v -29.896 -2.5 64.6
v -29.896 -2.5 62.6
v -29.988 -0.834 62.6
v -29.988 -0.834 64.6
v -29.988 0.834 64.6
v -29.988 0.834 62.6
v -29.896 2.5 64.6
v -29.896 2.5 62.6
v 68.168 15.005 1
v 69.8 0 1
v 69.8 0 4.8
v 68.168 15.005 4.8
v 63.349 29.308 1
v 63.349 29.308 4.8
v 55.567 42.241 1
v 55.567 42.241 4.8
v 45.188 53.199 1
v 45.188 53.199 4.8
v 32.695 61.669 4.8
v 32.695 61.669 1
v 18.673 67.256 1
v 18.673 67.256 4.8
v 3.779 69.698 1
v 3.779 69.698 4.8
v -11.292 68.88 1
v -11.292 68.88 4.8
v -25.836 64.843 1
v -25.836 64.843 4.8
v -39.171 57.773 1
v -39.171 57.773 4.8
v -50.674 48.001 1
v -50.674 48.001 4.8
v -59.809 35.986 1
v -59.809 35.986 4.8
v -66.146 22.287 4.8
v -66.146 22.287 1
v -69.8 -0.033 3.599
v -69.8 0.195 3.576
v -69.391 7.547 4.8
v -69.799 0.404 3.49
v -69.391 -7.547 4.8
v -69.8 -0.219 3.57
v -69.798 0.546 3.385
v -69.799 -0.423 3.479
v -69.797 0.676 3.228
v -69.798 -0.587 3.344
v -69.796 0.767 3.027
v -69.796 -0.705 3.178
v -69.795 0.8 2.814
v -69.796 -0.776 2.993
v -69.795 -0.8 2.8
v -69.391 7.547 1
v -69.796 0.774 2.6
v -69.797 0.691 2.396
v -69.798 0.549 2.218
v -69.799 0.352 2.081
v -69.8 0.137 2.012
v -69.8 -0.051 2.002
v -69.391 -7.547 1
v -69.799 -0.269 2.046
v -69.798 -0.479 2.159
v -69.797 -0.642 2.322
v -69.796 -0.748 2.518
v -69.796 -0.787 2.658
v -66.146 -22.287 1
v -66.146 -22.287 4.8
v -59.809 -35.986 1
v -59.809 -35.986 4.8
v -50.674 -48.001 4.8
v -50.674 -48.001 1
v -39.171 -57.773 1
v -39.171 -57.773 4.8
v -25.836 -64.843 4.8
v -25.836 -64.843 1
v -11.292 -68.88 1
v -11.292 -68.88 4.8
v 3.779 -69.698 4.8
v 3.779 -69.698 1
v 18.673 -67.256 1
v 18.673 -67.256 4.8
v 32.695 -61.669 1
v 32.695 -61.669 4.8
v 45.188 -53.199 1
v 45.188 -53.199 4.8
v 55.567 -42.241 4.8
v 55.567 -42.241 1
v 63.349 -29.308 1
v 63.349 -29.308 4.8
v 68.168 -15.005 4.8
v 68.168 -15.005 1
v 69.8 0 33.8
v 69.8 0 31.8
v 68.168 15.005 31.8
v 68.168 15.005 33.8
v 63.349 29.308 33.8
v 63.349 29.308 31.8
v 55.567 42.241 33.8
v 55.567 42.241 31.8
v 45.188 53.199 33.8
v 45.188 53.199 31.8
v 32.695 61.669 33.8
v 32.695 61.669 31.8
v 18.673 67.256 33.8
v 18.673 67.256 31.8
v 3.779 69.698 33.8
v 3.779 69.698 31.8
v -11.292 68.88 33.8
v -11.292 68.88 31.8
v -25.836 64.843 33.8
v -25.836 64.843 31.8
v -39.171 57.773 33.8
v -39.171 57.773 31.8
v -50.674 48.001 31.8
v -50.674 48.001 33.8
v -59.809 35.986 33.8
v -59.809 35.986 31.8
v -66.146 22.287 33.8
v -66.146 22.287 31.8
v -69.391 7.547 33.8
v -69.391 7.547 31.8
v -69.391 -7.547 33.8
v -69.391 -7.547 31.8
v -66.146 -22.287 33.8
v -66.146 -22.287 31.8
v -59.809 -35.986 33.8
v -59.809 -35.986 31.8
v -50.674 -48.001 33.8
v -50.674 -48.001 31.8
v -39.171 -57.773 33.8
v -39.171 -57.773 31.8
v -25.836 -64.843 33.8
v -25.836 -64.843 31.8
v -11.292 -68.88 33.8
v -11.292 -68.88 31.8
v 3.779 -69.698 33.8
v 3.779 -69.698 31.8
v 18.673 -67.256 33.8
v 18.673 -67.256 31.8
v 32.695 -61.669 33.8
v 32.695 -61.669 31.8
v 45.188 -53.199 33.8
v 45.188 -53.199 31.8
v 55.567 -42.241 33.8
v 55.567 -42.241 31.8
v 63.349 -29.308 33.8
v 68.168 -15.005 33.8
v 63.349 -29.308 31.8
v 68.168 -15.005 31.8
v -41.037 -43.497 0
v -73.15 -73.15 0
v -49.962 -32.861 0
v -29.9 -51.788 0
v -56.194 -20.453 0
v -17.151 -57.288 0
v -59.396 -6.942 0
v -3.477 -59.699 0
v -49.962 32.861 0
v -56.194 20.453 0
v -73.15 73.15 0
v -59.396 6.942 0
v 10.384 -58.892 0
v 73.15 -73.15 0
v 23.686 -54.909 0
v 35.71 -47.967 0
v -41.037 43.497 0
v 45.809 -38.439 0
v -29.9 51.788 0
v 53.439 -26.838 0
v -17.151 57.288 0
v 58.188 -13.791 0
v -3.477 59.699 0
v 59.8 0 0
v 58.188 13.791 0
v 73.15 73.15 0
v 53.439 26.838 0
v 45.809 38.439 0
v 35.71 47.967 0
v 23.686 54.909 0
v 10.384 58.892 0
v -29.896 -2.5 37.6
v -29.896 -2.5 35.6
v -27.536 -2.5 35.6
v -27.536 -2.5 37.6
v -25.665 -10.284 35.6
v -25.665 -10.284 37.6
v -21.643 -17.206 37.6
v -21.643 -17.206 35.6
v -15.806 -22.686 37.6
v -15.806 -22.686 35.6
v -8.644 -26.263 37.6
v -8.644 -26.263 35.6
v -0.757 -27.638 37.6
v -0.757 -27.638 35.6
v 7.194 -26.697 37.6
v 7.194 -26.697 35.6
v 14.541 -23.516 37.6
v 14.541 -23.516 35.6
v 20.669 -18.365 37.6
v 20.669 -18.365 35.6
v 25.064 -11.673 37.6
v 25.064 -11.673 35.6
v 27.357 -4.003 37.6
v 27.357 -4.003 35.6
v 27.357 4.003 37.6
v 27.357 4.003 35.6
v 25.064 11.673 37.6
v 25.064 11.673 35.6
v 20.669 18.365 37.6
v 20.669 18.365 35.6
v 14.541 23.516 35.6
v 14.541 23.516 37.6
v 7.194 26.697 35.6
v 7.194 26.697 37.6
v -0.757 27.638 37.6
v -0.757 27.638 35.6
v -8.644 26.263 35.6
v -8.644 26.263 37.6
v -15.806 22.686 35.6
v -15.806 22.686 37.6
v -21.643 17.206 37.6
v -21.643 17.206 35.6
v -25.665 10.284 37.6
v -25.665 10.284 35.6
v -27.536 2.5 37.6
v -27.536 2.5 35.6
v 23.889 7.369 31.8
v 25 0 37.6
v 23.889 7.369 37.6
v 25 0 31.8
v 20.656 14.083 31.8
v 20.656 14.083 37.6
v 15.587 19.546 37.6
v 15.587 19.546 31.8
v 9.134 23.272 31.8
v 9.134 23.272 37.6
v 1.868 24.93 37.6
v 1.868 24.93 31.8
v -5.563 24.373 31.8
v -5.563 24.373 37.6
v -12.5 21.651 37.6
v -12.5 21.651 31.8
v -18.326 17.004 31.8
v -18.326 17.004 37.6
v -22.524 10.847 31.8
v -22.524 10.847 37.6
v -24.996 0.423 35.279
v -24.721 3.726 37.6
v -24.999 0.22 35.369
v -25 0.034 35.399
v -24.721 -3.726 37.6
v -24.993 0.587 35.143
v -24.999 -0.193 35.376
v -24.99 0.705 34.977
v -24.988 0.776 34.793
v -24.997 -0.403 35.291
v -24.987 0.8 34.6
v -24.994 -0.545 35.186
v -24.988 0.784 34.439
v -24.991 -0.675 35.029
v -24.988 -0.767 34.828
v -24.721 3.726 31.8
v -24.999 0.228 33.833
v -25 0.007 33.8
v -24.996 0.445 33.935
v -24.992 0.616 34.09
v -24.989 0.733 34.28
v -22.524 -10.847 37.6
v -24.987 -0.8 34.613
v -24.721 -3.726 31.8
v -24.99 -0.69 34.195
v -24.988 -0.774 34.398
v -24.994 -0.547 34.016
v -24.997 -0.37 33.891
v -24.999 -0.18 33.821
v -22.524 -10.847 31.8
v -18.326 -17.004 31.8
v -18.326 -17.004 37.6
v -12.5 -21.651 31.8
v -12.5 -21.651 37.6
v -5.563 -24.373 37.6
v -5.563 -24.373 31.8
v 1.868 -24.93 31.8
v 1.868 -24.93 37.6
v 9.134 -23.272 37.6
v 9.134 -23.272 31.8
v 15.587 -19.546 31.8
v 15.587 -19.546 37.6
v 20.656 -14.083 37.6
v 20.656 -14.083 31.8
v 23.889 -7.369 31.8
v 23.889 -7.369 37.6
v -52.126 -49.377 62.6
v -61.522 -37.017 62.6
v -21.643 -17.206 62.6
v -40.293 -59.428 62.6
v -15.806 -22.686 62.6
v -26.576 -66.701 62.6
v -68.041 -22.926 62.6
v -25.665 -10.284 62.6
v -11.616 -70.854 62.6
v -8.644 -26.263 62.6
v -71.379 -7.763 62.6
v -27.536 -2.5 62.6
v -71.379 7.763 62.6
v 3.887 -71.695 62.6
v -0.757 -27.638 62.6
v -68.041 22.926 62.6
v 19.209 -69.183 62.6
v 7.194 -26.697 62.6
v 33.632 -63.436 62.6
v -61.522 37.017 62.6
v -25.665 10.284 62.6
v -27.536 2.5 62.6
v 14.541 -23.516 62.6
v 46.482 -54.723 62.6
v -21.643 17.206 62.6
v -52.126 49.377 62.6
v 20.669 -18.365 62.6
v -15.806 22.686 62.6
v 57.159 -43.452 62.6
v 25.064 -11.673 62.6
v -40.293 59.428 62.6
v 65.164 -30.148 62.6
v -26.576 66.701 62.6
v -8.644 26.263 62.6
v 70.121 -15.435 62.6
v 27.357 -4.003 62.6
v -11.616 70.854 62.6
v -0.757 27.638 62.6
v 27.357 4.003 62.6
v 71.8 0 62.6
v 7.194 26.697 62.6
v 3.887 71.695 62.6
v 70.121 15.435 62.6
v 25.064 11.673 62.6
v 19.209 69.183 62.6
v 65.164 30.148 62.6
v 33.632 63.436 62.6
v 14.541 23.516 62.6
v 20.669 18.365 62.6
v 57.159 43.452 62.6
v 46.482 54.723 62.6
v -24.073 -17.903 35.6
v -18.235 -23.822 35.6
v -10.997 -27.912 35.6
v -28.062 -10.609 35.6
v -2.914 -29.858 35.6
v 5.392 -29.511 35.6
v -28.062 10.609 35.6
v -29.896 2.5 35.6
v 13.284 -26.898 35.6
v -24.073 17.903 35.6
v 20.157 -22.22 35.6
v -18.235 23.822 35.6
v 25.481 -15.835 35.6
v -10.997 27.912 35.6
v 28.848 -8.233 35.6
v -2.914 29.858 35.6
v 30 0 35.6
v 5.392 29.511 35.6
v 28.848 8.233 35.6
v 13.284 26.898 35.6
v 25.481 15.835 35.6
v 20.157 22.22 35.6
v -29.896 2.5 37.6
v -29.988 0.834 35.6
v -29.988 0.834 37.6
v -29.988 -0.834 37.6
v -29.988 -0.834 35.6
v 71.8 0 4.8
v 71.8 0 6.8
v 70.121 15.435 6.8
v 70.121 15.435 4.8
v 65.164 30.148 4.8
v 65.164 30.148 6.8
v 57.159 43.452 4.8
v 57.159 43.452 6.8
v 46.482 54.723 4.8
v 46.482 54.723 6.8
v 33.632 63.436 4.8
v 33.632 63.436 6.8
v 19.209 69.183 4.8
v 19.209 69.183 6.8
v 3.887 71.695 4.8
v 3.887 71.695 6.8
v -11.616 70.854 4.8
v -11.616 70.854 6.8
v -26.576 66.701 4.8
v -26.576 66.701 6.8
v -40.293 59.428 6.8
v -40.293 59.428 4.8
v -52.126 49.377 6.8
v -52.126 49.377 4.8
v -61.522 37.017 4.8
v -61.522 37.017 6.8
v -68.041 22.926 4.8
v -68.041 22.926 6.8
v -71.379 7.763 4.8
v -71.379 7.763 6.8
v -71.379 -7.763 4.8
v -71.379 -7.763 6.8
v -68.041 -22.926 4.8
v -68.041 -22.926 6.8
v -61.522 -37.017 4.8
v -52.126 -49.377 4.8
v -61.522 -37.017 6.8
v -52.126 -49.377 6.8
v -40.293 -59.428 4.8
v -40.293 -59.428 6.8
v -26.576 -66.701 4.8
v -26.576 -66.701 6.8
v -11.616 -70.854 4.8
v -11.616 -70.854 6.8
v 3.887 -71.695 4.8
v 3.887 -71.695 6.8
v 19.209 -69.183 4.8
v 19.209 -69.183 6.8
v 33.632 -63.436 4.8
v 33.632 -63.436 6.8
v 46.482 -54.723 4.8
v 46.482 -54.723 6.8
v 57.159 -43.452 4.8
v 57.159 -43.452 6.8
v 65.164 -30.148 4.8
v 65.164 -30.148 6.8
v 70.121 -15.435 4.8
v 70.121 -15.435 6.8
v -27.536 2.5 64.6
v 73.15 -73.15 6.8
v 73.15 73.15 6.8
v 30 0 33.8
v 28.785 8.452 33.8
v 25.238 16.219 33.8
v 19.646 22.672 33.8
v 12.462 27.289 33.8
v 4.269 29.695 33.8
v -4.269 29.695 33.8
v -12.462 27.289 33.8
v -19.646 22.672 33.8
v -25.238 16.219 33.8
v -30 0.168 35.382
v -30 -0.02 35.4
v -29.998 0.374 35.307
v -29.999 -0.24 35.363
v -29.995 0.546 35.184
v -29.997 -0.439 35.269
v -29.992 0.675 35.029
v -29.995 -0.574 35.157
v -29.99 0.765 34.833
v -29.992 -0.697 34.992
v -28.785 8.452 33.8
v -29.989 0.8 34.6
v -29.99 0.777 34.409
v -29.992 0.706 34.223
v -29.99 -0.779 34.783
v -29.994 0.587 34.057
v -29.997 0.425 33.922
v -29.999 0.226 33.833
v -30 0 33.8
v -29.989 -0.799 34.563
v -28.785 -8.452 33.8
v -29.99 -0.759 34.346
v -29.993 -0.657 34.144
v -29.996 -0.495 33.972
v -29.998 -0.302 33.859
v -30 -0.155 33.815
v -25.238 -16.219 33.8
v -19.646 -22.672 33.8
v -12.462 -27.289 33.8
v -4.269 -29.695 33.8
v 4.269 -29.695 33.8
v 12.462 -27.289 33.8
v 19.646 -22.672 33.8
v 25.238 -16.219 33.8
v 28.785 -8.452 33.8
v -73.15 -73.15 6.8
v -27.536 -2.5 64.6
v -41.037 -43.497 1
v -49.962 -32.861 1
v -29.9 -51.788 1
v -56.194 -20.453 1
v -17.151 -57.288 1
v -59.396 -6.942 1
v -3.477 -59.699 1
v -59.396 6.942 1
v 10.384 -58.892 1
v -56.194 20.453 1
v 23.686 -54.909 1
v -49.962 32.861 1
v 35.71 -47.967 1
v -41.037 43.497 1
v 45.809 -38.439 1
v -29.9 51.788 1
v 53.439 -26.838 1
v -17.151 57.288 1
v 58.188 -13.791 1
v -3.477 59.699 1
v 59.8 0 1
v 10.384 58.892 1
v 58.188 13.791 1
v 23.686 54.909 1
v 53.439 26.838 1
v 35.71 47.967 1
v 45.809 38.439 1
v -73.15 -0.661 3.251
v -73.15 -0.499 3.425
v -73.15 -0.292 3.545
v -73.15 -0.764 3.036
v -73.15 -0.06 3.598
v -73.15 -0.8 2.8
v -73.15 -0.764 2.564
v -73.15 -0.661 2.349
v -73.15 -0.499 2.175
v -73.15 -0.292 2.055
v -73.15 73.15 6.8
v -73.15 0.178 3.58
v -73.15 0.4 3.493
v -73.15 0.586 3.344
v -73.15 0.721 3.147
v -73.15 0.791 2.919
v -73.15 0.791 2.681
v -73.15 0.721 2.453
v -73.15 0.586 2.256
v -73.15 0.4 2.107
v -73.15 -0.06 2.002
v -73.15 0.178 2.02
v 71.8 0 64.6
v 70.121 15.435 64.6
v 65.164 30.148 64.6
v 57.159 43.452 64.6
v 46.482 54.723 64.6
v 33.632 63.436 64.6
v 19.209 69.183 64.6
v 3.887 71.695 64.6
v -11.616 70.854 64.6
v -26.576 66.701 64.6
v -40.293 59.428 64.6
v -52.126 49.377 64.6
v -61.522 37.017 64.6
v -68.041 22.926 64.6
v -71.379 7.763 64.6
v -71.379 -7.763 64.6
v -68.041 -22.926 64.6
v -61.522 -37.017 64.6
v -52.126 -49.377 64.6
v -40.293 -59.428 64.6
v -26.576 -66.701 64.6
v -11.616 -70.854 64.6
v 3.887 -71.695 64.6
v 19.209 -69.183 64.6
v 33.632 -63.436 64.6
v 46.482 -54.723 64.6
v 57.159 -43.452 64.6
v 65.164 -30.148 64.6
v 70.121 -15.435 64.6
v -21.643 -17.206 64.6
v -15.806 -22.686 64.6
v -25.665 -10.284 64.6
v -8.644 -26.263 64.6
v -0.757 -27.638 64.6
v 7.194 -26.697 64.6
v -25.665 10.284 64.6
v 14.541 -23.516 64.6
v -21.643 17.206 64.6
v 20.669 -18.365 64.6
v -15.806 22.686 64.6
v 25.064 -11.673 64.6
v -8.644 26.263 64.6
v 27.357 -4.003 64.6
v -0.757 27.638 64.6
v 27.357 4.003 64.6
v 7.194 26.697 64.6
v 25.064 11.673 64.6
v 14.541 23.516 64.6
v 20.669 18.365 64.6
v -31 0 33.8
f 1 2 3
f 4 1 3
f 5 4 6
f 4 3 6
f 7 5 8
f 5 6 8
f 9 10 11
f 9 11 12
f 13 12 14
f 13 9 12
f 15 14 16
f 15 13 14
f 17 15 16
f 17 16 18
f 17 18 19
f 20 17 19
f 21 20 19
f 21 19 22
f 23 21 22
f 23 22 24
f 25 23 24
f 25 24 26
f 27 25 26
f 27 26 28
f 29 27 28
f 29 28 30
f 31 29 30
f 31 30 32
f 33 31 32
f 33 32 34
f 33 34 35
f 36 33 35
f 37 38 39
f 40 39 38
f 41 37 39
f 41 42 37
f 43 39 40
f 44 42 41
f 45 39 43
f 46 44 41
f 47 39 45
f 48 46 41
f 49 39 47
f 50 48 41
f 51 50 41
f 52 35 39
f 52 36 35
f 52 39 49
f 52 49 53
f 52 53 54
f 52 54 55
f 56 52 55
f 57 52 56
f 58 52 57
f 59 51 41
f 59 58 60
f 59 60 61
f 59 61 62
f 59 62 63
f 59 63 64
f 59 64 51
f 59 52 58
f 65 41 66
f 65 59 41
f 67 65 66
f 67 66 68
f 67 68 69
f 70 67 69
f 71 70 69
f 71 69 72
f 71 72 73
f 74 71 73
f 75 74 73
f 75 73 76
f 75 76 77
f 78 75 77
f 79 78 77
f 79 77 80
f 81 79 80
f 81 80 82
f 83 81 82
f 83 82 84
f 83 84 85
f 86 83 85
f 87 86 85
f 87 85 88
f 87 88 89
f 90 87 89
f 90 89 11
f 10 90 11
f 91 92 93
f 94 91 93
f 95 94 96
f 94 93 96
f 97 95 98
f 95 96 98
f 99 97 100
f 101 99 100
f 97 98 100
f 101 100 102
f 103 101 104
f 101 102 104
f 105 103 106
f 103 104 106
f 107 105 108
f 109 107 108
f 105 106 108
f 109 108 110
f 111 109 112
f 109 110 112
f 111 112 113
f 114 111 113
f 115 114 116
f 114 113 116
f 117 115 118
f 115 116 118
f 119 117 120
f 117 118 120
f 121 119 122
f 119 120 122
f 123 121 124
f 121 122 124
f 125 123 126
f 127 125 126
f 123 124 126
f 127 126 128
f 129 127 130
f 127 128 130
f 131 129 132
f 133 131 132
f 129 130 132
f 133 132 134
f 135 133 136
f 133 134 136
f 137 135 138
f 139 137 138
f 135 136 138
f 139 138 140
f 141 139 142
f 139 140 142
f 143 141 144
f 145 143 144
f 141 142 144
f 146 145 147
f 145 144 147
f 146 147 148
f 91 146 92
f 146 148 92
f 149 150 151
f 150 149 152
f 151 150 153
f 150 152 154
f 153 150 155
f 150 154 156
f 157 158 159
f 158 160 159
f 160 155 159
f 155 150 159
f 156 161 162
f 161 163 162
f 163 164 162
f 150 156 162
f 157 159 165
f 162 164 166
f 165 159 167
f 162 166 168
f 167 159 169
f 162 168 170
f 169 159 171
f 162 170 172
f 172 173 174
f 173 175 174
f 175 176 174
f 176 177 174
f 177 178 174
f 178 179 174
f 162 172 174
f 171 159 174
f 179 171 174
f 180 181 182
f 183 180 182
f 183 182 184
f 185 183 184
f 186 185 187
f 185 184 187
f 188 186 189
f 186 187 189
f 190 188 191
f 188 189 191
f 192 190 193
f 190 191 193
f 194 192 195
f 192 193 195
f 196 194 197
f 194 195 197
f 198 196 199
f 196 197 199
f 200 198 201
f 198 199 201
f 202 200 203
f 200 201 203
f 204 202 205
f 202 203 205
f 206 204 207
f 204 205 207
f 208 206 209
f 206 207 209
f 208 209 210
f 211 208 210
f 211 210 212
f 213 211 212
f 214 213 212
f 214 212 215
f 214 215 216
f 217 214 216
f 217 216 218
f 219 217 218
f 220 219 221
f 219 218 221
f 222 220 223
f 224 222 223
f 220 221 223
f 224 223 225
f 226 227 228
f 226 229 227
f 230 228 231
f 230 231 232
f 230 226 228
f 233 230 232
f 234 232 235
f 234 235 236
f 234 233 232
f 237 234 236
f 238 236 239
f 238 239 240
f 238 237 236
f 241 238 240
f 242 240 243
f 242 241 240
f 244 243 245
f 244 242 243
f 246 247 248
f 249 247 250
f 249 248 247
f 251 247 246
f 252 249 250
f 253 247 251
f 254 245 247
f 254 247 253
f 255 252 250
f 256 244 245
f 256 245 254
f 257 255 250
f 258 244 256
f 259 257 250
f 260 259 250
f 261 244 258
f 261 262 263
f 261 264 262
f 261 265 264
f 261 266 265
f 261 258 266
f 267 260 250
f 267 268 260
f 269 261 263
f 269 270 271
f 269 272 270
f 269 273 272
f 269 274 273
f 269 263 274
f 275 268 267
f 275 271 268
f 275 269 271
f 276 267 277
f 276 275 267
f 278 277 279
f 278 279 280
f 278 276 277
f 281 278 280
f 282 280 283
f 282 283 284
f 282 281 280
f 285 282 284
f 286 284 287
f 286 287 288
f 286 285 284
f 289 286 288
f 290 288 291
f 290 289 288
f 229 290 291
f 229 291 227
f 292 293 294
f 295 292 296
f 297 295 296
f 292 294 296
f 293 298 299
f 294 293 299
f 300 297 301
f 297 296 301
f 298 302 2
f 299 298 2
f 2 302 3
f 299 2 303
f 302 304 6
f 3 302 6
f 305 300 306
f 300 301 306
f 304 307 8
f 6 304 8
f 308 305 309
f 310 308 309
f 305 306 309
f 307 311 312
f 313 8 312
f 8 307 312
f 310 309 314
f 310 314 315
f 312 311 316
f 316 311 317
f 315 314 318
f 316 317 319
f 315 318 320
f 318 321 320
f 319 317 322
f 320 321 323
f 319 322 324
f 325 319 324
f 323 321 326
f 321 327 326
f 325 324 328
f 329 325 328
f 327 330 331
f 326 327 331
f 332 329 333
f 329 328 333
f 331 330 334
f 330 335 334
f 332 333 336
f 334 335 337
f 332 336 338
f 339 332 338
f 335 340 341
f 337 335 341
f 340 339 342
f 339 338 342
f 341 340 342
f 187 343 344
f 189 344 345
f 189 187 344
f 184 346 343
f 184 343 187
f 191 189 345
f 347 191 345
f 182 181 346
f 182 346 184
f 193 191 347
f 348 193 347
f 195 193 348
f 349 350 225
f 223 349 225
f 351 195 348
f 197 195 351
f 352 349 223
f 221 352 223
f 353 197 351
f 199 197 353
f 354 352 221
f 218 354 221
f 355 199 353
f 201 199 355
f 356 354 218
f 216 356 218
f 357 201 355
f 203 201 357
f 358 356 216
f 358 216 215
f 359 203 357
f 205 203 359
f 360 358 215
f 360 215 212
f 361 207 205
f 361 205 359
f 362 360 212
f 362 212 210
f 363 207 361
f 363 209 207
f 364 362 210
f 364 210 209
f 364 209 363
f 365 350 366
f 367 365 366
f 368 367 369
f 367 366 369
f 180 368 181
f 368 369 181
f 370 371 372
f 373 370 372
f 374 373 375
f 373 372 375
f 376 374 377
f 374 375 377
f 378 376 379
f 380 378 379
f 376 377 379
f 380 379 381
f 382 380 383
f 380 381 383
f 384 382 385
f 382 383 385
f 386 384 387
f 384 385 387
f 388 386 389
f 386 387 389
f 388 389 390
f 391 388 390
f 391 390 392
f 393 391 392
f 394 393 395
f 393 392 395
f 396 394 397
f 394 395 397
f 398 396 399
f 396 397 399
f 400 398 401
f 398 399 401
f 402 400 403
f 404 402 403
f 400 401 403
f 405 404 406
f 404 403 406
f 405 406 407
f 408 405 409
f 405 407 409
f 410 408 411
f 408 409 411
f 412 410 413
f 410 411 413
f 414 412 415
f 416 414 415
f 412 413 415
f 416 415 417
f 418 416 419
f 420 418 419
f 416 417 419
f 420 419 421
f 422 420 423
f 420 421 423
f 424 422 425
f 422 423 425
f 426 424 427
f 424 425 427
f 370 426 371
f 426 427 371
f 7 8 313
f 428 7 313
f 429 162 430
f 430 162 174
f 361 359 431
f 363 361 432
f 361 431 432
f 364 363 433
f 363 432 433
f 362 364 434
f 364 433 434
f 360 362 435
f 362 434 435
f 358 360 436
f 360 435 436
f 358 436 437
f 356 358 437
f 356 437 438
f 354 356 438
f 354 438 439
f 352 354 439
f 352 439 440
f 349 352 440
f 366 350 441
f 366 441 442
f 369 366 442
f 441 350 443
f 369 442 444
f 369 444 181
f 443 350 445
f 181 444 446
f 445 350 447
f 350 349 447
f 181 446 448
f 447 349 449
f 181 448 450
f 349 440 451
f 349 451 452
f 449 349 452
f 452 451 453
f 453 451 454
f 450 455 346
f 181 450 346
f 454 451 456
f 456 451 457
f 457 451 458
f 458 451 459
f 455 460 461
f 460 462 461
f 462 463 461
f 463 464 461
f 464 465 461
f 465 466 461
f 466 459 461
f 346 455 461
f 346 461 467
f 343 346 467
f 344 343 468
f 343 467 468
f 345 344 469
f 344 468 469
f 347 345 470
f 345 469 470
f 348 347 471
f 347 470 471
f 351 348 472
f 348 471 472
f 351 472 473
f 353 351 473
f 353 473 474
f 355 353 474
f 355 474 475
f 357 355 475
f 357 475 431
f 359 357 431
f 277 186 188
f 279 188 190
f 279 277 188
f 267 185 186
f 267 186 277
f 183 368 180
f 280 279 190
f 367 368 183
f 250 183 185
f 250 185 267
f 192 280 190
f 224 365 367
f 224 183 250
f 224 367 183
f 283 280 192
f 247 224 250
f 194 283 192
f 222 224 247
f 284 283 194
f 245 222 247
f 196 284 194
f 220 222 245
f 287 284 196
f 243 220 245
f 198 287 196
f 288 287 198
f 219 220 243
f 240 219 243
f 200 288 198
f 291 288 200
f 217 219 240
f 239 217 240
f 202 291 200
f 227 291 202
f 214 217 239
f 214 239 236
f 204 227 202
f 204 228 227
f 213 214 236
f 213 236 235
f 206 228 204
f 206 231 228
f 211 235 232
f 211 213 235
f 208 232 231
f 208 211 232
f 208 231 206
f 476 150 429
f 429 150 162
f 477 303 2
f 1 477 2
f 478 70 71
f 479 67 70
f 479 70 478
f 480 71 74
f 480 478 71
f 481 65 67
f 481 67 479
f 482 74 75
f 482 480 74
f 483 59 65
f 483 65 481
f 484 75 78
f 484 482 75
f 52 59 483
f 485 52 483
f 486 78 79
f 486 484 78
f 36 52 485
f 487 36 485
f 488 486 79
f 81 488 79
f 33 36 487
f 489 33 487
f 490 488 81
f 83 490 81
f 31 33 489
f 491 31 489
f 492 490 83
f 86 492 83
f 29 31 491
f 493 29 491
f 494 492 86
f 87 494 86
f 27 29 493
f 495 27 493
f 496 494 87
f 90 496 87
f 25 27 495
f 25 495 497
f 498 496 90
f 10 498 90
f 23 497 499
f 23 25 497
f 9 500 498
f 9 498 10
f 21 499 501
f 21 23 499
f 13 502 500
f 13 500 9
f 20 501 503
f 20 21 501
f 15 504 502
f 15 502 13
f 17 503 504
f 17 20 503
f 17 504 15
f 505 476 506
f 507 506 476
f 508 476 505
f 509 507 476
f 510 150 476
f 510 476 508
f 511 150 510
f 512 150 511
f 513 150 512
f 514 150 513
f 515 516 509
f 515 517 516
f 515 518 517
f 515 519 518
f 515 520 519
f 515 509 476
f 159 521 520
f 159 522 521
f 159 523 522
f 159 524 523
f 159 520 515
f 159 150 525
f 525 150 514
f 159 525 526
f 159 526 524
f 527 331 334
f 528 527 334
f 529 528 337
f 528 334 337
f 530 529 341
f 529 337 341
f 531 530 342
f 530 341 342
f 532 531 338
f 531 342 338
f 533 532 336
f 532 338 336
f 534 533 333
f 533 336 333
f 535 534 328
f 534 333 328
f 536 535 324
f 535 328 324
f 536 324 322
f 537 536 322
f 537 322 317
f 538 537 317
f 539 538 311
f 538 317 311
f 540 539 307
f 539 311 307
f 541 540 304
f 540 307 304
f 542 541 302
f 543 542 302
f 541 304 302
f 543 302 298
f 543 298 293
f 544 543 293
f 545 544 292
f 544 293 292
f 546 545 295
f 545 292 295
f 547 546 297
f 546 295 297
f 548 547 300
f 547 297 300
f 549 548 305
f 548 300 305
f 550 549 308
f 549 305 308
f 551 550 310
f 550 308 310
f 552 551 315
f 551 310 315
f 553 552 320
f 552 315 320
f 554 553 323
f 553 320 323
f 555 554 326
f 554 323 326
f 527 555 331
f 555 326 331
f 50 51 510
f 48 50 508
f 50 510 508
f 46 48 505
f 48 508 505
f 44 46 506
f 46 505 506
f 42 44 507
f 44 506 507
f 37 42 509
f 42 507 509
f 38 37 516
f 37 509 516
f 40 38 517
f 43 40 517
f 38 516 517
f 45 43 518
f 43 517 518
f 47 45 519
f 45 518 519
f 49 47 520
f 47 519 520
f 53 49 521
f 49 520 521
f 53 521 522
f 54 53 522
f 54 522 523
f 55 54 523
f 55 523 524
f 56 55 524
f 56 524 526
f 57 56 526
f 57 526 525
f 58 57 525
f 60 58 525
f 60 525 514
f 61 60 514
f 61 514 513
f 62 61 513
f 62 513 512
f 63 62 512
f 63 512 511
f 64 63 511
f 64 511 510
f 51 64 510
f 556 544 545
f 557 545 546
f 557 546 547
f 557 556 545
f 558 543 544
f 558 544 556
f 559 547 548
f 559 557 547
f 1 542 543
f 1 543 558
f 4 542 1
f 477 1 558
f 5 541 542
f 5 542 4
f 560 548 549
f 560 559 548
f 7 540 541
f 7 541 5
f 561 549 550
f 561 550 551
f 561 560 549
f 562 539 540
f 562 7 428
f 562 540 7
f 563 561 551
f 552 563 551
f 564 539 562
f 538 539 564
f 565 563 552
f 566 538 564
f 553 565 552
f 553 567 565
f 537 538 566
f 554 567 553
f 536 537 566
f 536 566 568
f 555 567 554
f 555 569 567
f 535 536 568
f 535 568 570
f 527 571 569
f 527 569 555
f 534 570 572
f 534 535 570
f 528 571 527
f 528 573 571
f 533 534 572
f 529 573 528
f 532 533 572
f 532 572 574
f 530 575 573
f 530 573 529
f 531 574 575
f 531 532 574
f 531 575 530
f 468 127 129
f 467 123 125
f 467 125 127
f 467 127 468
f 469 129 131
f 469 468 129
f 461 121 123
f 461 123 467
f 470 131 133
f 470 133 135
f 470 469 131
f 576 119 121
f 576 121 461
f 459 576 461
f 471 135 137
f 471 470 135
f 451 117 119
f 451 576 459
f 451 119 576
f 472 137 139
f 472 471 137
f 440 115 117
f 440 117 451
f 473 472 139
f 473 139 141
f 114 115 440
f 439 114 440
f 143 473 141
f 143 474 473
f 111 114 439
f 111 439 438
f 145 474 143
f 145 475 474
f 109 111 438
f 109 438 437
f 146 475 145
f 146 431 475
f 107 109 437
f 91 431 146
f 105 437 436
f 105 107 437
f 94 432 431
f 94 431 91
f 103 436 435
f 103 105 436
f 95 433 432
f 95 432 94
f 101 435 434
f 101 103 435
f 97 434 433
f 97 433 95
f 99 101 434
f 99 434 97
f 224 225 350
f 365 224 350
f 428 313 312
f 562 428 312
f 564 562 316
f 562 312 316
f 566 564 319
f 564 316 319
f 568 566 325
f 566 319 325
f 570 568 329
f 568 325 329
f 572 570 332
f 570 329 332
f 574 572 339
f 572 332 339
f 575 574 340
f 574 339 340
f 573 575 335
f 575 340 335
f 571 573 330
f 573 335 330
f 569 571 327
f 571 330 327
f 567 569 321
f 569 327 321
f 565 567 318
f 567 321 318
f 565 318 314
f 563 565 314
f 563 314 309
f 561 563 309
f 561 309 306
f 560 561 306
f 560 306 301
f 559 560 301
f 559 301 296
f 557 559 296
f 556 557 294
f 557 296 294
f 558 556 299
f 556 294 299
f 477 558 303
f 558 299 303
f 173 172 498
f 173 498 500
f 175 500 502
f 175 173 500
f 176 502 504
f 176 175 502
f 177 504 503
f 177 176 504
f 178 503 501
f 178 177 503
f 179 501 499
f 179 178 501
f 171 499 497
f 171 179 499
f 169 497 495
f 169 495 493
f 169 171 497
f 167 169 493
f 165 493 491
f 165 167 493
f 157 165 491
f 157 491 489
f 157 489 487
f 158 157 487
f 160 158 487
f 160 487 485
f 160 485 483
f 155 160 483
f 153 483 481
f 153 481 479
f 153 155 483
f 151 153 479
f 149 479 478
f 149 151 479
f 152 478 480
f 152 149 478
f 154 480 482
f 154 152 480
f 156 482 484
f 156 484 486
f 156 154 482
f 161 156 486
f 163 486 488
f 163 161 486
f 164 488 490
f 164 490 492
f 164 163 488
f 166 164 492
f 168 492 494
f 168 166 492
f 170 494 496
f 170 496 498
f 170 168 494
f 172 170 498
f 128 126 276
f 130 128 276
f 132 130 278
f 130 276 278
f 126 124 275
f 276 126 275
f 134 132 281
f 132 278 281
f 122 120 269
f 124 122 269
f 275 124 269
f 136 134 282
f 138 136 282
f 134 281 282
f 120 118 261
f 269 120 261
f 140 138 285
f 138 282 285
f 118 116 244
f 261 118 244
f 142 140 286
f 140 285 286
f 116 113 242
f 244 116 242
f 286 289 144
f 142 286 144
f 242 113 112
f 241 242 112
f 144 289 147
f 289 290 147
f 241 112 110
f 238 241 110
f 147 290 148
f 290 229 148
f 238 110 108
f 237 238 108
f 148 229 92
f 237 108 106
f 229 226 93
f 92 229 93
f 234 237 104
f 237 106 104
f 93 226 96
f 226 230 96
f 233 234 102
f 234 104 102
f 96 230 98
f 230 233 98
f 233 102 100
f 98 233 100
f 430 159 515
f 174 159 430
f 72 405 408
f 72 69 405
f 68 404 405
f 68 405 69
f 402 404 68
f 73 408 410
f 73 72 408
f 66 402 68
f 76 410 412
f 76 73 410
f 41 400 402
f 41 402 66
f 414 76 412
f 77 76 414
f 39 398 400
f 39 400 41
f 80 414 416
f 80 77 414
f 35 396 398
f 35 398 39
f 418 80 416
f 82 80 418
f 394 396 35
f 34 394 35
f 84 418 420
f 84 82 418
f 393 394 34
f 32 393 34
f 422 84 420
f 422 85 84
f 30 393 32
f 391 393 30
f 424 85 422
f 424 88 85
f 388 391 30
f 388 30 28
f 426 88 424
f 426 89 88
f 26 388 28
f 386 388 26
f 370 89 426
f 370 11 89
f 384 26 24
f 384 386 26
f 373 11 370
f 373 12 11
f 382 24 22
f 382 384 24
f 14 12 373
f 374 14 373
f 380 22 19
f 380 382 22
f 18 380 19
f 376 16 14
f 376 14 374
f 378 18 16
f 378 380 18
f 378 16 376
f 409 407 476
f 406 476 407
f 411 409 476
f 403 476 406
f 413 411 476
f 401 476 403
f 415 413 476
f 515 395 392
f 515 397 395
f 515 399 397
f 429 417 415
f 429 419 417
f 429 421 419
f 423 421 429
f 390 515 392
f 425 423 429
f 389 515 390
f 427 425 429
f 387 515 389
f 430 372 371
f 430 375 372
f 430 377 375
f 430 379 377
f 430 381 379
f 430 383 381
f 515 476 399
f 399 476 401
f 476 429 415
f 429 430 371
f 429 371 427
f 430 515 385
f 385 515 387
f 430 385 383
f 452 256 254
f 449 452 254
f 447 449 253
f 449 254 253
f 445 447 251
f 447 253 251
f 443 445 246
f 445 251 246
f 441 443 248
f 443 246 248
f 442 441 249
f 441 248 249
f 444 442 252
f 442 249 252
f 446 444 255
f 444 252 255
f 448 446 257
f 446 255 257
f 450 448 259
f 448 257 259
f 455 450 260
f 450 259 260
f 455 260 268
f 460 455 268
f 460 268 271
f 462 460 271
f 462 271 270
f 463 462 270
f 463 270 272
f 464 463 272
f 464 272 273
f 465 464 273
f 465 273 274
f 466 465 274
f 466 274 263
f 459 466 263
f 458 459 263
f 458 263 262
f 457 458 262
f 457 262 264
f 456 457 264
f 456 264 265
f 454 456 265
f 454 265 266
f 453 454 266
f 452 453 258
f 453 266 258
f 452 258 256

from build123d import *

# Parameters (mm, degrees)
F0_W      = 146.3
F0_H      = 146.3
F0_R      = 69.8
F1_DEPTH  = 6.8
F0_R_2    = 59.8
F2_DEPTH  = 1
F4_R      = 69.8
F4_R_2    = 30
F5_DEPTH  = 2
F4_R_3    = 25
F6_DEPTH  = 3.8
F7_R      = 25
F8_DEPTH  = 2
F9_R      = 0.8
F10_DEPTH = 31.0000001
F12_R     = 71.8
F13_DEPTH = 2
F14_R     = 0.8
F15_DEPTH = 3.3555847778
F16_R     = 71.8
F16_R_2   = 69.8
F17_DEPTH = 2
F18_DEPTH = 2


with BuildPart() as f1:
    # F0 (on Top) → F1 (new body)
    with BuildSketch(Plane.XY):
        Rectangle(F0_W, F0_H)
        Circle(F0_R, mode=Mode.SUBTRACT)
    extrude(amount=F1_DEPTH)

    # F0 (on Top) → F2 (join)
    with BuildSketch(Plane.XY):
        Circle(F0_R)
        Circle(F0_R_2, mode=Mode.SUBTRACT)
    extrude(amount=F2_DEPTH)

    # F14 (on face) → F15 (cut, through all)
    with BuildSketch(Plane(origin=(-73.15, 0, 0), x_dir=(0, -1, 0), z_dir=(-1, 0, 0))):
        with Locations((0, 2.8)):
            Circle(F14_R)
    extrude(amount=-F15_DEPTH, mode=Mode.SUBTRACT)

    # F16 (on face) → F17 (cut)
    with BuildSketch(Plane.XY.offset(6.8)):
        Circle(F16_R)
        Circle(F16_R_2, mode=Mode.SUBTRACT)
    extrude(amount=-F17_DEPTH, mode=Mode.SUBTRACT)


with BuildPart() as f5:
    # F4 (on offset) → F5 (new body)
    with BuildSketch(Plane.XY.offset(31.8)):
        Circle(F4_R)
        Circle(F4_R_2, mode=Mode.SUBTRACT)
    extrude(amount=F5_DEPTH)

    # F4 (on offset) → F6 (join)
    with BuildSketch(Plane.XY.offset(31.8)):
        Circle(F4_R_2)
        Circle(F4_R_3, mode=Mode.SUBTRACT)
    extrude(amount=F6_DEPTH)

    # F7 (on face) → F8 (join)
    with BuildSketch(Plane.XY.offset(35.6)):
        with BuildLine():
            ThreePointArc((-27.5355140939, -2.5), (1.2512820546, -27.6204422418), (27.6487709747, 0))
            ThreePointArc((27.6487709747, 0), (1.2512820546, 27.6204422418), (-27.5355140939, 2.5))
            ThreePointArc((-27.5355140939, 2.5), (-27.6487709747, 0), (-27.5355140939, -2.5))
        make_face()
        Circle(F7_R, mode=Mode.SUBTRACT)
        with BuildLine():
            ThreePointArc((-27.5355140939, -2.5), (-27.6487709747, 0), (-27.5355140939, 2.5))
            Line((-27.5355140939, 2.5), (-29.8956518578, 2.5))
            ThreePointArc((-29.8956518578, 2.5), (-30, 0), (-29.8956518578, -2.5))
            Line((-29.8956518578, -2.5), (-27.5355140939, -2.5))
        make_face()
    extrude(amount=F8_DEPTH)

    # F9 (on Right) → F10 (cut, up to face)
    with BuildSketch(Plane.YZ):
        with Locations((0, 34.6)):
            Circle(F9_R)
    extrude(amount=-F10_DEPTH, mode=Mode.SUBTRACT)

    # F7 (on face) → F18 (join)
    with BuildSketch(Plane.XY.offset(35.6)):
        with BuildLine():
            ThreePointArc((-27.5355140939, -2.5), (1.2512820546, -27.6204422418), (27.6487709747, 0))
            ThreePointArc((27.6487709747, 0), (1.2512820546, 27.6204422418), (-27.5355140939, 2.5))
            ThreePointArc((-27.5355140939, 2.5), (-27.6487709747, 0), (-27.5355140939, -2.5))
        make_face()
        Circle(F7_R, mode=Mode.SUBTRACT)
        with BuildLine():
            ThreePointArc((-27.5355140939, -2.5), (-27.6487709747, 0), (-27.5355140939, 2.5))
            Line((-27.5355140939, 2.5), (-29.8956518578, 2.5))
            ThreePointArc((-29.8956518578, 2.5), (-30, 0), (-29.8956518578, -2.5))
            Line((-29.8956518578, -2.5), (-27.5355140939, -2.5))
        make_face()
    extrude(amount=F18_DEPTH)


with BuildPart() as f13:
    # F12 (on offset) → F13 (new body)
    with BuildSketch(Plane.XY.offset(62.6)):
        Circle(F12_R)
        with BuildLine():
            ThreePointArc((-29.8956518578, 2.5), (30, 0), (-29.8956518578, -2.5))
            ThreePointArc((-29.8956518578, -2.5), (-30, 0), (-29.8956518578, 2.5))
        make_face(mode=Mode.SUBTRACT)
        with BuildLine():
            Line((-27.5355140939, -2.5), (-29.8956518578, -2.5))
            ThreePointArc((-29.8956518578, -2.5), (30, 0), (-29.8956518578, 2.5))
            Line((-29.8956518578, 2.5), (-27.5355140939, 2.5))
            ThreePointArc((-27.5355140939, 2.5), (27.6487709747, 0), (-27.5355140939, -2.5))
        make_face()
    extrude(amount=F13_DEPTH)


solid = Compound([f1.part, f5.part, f13.part])
